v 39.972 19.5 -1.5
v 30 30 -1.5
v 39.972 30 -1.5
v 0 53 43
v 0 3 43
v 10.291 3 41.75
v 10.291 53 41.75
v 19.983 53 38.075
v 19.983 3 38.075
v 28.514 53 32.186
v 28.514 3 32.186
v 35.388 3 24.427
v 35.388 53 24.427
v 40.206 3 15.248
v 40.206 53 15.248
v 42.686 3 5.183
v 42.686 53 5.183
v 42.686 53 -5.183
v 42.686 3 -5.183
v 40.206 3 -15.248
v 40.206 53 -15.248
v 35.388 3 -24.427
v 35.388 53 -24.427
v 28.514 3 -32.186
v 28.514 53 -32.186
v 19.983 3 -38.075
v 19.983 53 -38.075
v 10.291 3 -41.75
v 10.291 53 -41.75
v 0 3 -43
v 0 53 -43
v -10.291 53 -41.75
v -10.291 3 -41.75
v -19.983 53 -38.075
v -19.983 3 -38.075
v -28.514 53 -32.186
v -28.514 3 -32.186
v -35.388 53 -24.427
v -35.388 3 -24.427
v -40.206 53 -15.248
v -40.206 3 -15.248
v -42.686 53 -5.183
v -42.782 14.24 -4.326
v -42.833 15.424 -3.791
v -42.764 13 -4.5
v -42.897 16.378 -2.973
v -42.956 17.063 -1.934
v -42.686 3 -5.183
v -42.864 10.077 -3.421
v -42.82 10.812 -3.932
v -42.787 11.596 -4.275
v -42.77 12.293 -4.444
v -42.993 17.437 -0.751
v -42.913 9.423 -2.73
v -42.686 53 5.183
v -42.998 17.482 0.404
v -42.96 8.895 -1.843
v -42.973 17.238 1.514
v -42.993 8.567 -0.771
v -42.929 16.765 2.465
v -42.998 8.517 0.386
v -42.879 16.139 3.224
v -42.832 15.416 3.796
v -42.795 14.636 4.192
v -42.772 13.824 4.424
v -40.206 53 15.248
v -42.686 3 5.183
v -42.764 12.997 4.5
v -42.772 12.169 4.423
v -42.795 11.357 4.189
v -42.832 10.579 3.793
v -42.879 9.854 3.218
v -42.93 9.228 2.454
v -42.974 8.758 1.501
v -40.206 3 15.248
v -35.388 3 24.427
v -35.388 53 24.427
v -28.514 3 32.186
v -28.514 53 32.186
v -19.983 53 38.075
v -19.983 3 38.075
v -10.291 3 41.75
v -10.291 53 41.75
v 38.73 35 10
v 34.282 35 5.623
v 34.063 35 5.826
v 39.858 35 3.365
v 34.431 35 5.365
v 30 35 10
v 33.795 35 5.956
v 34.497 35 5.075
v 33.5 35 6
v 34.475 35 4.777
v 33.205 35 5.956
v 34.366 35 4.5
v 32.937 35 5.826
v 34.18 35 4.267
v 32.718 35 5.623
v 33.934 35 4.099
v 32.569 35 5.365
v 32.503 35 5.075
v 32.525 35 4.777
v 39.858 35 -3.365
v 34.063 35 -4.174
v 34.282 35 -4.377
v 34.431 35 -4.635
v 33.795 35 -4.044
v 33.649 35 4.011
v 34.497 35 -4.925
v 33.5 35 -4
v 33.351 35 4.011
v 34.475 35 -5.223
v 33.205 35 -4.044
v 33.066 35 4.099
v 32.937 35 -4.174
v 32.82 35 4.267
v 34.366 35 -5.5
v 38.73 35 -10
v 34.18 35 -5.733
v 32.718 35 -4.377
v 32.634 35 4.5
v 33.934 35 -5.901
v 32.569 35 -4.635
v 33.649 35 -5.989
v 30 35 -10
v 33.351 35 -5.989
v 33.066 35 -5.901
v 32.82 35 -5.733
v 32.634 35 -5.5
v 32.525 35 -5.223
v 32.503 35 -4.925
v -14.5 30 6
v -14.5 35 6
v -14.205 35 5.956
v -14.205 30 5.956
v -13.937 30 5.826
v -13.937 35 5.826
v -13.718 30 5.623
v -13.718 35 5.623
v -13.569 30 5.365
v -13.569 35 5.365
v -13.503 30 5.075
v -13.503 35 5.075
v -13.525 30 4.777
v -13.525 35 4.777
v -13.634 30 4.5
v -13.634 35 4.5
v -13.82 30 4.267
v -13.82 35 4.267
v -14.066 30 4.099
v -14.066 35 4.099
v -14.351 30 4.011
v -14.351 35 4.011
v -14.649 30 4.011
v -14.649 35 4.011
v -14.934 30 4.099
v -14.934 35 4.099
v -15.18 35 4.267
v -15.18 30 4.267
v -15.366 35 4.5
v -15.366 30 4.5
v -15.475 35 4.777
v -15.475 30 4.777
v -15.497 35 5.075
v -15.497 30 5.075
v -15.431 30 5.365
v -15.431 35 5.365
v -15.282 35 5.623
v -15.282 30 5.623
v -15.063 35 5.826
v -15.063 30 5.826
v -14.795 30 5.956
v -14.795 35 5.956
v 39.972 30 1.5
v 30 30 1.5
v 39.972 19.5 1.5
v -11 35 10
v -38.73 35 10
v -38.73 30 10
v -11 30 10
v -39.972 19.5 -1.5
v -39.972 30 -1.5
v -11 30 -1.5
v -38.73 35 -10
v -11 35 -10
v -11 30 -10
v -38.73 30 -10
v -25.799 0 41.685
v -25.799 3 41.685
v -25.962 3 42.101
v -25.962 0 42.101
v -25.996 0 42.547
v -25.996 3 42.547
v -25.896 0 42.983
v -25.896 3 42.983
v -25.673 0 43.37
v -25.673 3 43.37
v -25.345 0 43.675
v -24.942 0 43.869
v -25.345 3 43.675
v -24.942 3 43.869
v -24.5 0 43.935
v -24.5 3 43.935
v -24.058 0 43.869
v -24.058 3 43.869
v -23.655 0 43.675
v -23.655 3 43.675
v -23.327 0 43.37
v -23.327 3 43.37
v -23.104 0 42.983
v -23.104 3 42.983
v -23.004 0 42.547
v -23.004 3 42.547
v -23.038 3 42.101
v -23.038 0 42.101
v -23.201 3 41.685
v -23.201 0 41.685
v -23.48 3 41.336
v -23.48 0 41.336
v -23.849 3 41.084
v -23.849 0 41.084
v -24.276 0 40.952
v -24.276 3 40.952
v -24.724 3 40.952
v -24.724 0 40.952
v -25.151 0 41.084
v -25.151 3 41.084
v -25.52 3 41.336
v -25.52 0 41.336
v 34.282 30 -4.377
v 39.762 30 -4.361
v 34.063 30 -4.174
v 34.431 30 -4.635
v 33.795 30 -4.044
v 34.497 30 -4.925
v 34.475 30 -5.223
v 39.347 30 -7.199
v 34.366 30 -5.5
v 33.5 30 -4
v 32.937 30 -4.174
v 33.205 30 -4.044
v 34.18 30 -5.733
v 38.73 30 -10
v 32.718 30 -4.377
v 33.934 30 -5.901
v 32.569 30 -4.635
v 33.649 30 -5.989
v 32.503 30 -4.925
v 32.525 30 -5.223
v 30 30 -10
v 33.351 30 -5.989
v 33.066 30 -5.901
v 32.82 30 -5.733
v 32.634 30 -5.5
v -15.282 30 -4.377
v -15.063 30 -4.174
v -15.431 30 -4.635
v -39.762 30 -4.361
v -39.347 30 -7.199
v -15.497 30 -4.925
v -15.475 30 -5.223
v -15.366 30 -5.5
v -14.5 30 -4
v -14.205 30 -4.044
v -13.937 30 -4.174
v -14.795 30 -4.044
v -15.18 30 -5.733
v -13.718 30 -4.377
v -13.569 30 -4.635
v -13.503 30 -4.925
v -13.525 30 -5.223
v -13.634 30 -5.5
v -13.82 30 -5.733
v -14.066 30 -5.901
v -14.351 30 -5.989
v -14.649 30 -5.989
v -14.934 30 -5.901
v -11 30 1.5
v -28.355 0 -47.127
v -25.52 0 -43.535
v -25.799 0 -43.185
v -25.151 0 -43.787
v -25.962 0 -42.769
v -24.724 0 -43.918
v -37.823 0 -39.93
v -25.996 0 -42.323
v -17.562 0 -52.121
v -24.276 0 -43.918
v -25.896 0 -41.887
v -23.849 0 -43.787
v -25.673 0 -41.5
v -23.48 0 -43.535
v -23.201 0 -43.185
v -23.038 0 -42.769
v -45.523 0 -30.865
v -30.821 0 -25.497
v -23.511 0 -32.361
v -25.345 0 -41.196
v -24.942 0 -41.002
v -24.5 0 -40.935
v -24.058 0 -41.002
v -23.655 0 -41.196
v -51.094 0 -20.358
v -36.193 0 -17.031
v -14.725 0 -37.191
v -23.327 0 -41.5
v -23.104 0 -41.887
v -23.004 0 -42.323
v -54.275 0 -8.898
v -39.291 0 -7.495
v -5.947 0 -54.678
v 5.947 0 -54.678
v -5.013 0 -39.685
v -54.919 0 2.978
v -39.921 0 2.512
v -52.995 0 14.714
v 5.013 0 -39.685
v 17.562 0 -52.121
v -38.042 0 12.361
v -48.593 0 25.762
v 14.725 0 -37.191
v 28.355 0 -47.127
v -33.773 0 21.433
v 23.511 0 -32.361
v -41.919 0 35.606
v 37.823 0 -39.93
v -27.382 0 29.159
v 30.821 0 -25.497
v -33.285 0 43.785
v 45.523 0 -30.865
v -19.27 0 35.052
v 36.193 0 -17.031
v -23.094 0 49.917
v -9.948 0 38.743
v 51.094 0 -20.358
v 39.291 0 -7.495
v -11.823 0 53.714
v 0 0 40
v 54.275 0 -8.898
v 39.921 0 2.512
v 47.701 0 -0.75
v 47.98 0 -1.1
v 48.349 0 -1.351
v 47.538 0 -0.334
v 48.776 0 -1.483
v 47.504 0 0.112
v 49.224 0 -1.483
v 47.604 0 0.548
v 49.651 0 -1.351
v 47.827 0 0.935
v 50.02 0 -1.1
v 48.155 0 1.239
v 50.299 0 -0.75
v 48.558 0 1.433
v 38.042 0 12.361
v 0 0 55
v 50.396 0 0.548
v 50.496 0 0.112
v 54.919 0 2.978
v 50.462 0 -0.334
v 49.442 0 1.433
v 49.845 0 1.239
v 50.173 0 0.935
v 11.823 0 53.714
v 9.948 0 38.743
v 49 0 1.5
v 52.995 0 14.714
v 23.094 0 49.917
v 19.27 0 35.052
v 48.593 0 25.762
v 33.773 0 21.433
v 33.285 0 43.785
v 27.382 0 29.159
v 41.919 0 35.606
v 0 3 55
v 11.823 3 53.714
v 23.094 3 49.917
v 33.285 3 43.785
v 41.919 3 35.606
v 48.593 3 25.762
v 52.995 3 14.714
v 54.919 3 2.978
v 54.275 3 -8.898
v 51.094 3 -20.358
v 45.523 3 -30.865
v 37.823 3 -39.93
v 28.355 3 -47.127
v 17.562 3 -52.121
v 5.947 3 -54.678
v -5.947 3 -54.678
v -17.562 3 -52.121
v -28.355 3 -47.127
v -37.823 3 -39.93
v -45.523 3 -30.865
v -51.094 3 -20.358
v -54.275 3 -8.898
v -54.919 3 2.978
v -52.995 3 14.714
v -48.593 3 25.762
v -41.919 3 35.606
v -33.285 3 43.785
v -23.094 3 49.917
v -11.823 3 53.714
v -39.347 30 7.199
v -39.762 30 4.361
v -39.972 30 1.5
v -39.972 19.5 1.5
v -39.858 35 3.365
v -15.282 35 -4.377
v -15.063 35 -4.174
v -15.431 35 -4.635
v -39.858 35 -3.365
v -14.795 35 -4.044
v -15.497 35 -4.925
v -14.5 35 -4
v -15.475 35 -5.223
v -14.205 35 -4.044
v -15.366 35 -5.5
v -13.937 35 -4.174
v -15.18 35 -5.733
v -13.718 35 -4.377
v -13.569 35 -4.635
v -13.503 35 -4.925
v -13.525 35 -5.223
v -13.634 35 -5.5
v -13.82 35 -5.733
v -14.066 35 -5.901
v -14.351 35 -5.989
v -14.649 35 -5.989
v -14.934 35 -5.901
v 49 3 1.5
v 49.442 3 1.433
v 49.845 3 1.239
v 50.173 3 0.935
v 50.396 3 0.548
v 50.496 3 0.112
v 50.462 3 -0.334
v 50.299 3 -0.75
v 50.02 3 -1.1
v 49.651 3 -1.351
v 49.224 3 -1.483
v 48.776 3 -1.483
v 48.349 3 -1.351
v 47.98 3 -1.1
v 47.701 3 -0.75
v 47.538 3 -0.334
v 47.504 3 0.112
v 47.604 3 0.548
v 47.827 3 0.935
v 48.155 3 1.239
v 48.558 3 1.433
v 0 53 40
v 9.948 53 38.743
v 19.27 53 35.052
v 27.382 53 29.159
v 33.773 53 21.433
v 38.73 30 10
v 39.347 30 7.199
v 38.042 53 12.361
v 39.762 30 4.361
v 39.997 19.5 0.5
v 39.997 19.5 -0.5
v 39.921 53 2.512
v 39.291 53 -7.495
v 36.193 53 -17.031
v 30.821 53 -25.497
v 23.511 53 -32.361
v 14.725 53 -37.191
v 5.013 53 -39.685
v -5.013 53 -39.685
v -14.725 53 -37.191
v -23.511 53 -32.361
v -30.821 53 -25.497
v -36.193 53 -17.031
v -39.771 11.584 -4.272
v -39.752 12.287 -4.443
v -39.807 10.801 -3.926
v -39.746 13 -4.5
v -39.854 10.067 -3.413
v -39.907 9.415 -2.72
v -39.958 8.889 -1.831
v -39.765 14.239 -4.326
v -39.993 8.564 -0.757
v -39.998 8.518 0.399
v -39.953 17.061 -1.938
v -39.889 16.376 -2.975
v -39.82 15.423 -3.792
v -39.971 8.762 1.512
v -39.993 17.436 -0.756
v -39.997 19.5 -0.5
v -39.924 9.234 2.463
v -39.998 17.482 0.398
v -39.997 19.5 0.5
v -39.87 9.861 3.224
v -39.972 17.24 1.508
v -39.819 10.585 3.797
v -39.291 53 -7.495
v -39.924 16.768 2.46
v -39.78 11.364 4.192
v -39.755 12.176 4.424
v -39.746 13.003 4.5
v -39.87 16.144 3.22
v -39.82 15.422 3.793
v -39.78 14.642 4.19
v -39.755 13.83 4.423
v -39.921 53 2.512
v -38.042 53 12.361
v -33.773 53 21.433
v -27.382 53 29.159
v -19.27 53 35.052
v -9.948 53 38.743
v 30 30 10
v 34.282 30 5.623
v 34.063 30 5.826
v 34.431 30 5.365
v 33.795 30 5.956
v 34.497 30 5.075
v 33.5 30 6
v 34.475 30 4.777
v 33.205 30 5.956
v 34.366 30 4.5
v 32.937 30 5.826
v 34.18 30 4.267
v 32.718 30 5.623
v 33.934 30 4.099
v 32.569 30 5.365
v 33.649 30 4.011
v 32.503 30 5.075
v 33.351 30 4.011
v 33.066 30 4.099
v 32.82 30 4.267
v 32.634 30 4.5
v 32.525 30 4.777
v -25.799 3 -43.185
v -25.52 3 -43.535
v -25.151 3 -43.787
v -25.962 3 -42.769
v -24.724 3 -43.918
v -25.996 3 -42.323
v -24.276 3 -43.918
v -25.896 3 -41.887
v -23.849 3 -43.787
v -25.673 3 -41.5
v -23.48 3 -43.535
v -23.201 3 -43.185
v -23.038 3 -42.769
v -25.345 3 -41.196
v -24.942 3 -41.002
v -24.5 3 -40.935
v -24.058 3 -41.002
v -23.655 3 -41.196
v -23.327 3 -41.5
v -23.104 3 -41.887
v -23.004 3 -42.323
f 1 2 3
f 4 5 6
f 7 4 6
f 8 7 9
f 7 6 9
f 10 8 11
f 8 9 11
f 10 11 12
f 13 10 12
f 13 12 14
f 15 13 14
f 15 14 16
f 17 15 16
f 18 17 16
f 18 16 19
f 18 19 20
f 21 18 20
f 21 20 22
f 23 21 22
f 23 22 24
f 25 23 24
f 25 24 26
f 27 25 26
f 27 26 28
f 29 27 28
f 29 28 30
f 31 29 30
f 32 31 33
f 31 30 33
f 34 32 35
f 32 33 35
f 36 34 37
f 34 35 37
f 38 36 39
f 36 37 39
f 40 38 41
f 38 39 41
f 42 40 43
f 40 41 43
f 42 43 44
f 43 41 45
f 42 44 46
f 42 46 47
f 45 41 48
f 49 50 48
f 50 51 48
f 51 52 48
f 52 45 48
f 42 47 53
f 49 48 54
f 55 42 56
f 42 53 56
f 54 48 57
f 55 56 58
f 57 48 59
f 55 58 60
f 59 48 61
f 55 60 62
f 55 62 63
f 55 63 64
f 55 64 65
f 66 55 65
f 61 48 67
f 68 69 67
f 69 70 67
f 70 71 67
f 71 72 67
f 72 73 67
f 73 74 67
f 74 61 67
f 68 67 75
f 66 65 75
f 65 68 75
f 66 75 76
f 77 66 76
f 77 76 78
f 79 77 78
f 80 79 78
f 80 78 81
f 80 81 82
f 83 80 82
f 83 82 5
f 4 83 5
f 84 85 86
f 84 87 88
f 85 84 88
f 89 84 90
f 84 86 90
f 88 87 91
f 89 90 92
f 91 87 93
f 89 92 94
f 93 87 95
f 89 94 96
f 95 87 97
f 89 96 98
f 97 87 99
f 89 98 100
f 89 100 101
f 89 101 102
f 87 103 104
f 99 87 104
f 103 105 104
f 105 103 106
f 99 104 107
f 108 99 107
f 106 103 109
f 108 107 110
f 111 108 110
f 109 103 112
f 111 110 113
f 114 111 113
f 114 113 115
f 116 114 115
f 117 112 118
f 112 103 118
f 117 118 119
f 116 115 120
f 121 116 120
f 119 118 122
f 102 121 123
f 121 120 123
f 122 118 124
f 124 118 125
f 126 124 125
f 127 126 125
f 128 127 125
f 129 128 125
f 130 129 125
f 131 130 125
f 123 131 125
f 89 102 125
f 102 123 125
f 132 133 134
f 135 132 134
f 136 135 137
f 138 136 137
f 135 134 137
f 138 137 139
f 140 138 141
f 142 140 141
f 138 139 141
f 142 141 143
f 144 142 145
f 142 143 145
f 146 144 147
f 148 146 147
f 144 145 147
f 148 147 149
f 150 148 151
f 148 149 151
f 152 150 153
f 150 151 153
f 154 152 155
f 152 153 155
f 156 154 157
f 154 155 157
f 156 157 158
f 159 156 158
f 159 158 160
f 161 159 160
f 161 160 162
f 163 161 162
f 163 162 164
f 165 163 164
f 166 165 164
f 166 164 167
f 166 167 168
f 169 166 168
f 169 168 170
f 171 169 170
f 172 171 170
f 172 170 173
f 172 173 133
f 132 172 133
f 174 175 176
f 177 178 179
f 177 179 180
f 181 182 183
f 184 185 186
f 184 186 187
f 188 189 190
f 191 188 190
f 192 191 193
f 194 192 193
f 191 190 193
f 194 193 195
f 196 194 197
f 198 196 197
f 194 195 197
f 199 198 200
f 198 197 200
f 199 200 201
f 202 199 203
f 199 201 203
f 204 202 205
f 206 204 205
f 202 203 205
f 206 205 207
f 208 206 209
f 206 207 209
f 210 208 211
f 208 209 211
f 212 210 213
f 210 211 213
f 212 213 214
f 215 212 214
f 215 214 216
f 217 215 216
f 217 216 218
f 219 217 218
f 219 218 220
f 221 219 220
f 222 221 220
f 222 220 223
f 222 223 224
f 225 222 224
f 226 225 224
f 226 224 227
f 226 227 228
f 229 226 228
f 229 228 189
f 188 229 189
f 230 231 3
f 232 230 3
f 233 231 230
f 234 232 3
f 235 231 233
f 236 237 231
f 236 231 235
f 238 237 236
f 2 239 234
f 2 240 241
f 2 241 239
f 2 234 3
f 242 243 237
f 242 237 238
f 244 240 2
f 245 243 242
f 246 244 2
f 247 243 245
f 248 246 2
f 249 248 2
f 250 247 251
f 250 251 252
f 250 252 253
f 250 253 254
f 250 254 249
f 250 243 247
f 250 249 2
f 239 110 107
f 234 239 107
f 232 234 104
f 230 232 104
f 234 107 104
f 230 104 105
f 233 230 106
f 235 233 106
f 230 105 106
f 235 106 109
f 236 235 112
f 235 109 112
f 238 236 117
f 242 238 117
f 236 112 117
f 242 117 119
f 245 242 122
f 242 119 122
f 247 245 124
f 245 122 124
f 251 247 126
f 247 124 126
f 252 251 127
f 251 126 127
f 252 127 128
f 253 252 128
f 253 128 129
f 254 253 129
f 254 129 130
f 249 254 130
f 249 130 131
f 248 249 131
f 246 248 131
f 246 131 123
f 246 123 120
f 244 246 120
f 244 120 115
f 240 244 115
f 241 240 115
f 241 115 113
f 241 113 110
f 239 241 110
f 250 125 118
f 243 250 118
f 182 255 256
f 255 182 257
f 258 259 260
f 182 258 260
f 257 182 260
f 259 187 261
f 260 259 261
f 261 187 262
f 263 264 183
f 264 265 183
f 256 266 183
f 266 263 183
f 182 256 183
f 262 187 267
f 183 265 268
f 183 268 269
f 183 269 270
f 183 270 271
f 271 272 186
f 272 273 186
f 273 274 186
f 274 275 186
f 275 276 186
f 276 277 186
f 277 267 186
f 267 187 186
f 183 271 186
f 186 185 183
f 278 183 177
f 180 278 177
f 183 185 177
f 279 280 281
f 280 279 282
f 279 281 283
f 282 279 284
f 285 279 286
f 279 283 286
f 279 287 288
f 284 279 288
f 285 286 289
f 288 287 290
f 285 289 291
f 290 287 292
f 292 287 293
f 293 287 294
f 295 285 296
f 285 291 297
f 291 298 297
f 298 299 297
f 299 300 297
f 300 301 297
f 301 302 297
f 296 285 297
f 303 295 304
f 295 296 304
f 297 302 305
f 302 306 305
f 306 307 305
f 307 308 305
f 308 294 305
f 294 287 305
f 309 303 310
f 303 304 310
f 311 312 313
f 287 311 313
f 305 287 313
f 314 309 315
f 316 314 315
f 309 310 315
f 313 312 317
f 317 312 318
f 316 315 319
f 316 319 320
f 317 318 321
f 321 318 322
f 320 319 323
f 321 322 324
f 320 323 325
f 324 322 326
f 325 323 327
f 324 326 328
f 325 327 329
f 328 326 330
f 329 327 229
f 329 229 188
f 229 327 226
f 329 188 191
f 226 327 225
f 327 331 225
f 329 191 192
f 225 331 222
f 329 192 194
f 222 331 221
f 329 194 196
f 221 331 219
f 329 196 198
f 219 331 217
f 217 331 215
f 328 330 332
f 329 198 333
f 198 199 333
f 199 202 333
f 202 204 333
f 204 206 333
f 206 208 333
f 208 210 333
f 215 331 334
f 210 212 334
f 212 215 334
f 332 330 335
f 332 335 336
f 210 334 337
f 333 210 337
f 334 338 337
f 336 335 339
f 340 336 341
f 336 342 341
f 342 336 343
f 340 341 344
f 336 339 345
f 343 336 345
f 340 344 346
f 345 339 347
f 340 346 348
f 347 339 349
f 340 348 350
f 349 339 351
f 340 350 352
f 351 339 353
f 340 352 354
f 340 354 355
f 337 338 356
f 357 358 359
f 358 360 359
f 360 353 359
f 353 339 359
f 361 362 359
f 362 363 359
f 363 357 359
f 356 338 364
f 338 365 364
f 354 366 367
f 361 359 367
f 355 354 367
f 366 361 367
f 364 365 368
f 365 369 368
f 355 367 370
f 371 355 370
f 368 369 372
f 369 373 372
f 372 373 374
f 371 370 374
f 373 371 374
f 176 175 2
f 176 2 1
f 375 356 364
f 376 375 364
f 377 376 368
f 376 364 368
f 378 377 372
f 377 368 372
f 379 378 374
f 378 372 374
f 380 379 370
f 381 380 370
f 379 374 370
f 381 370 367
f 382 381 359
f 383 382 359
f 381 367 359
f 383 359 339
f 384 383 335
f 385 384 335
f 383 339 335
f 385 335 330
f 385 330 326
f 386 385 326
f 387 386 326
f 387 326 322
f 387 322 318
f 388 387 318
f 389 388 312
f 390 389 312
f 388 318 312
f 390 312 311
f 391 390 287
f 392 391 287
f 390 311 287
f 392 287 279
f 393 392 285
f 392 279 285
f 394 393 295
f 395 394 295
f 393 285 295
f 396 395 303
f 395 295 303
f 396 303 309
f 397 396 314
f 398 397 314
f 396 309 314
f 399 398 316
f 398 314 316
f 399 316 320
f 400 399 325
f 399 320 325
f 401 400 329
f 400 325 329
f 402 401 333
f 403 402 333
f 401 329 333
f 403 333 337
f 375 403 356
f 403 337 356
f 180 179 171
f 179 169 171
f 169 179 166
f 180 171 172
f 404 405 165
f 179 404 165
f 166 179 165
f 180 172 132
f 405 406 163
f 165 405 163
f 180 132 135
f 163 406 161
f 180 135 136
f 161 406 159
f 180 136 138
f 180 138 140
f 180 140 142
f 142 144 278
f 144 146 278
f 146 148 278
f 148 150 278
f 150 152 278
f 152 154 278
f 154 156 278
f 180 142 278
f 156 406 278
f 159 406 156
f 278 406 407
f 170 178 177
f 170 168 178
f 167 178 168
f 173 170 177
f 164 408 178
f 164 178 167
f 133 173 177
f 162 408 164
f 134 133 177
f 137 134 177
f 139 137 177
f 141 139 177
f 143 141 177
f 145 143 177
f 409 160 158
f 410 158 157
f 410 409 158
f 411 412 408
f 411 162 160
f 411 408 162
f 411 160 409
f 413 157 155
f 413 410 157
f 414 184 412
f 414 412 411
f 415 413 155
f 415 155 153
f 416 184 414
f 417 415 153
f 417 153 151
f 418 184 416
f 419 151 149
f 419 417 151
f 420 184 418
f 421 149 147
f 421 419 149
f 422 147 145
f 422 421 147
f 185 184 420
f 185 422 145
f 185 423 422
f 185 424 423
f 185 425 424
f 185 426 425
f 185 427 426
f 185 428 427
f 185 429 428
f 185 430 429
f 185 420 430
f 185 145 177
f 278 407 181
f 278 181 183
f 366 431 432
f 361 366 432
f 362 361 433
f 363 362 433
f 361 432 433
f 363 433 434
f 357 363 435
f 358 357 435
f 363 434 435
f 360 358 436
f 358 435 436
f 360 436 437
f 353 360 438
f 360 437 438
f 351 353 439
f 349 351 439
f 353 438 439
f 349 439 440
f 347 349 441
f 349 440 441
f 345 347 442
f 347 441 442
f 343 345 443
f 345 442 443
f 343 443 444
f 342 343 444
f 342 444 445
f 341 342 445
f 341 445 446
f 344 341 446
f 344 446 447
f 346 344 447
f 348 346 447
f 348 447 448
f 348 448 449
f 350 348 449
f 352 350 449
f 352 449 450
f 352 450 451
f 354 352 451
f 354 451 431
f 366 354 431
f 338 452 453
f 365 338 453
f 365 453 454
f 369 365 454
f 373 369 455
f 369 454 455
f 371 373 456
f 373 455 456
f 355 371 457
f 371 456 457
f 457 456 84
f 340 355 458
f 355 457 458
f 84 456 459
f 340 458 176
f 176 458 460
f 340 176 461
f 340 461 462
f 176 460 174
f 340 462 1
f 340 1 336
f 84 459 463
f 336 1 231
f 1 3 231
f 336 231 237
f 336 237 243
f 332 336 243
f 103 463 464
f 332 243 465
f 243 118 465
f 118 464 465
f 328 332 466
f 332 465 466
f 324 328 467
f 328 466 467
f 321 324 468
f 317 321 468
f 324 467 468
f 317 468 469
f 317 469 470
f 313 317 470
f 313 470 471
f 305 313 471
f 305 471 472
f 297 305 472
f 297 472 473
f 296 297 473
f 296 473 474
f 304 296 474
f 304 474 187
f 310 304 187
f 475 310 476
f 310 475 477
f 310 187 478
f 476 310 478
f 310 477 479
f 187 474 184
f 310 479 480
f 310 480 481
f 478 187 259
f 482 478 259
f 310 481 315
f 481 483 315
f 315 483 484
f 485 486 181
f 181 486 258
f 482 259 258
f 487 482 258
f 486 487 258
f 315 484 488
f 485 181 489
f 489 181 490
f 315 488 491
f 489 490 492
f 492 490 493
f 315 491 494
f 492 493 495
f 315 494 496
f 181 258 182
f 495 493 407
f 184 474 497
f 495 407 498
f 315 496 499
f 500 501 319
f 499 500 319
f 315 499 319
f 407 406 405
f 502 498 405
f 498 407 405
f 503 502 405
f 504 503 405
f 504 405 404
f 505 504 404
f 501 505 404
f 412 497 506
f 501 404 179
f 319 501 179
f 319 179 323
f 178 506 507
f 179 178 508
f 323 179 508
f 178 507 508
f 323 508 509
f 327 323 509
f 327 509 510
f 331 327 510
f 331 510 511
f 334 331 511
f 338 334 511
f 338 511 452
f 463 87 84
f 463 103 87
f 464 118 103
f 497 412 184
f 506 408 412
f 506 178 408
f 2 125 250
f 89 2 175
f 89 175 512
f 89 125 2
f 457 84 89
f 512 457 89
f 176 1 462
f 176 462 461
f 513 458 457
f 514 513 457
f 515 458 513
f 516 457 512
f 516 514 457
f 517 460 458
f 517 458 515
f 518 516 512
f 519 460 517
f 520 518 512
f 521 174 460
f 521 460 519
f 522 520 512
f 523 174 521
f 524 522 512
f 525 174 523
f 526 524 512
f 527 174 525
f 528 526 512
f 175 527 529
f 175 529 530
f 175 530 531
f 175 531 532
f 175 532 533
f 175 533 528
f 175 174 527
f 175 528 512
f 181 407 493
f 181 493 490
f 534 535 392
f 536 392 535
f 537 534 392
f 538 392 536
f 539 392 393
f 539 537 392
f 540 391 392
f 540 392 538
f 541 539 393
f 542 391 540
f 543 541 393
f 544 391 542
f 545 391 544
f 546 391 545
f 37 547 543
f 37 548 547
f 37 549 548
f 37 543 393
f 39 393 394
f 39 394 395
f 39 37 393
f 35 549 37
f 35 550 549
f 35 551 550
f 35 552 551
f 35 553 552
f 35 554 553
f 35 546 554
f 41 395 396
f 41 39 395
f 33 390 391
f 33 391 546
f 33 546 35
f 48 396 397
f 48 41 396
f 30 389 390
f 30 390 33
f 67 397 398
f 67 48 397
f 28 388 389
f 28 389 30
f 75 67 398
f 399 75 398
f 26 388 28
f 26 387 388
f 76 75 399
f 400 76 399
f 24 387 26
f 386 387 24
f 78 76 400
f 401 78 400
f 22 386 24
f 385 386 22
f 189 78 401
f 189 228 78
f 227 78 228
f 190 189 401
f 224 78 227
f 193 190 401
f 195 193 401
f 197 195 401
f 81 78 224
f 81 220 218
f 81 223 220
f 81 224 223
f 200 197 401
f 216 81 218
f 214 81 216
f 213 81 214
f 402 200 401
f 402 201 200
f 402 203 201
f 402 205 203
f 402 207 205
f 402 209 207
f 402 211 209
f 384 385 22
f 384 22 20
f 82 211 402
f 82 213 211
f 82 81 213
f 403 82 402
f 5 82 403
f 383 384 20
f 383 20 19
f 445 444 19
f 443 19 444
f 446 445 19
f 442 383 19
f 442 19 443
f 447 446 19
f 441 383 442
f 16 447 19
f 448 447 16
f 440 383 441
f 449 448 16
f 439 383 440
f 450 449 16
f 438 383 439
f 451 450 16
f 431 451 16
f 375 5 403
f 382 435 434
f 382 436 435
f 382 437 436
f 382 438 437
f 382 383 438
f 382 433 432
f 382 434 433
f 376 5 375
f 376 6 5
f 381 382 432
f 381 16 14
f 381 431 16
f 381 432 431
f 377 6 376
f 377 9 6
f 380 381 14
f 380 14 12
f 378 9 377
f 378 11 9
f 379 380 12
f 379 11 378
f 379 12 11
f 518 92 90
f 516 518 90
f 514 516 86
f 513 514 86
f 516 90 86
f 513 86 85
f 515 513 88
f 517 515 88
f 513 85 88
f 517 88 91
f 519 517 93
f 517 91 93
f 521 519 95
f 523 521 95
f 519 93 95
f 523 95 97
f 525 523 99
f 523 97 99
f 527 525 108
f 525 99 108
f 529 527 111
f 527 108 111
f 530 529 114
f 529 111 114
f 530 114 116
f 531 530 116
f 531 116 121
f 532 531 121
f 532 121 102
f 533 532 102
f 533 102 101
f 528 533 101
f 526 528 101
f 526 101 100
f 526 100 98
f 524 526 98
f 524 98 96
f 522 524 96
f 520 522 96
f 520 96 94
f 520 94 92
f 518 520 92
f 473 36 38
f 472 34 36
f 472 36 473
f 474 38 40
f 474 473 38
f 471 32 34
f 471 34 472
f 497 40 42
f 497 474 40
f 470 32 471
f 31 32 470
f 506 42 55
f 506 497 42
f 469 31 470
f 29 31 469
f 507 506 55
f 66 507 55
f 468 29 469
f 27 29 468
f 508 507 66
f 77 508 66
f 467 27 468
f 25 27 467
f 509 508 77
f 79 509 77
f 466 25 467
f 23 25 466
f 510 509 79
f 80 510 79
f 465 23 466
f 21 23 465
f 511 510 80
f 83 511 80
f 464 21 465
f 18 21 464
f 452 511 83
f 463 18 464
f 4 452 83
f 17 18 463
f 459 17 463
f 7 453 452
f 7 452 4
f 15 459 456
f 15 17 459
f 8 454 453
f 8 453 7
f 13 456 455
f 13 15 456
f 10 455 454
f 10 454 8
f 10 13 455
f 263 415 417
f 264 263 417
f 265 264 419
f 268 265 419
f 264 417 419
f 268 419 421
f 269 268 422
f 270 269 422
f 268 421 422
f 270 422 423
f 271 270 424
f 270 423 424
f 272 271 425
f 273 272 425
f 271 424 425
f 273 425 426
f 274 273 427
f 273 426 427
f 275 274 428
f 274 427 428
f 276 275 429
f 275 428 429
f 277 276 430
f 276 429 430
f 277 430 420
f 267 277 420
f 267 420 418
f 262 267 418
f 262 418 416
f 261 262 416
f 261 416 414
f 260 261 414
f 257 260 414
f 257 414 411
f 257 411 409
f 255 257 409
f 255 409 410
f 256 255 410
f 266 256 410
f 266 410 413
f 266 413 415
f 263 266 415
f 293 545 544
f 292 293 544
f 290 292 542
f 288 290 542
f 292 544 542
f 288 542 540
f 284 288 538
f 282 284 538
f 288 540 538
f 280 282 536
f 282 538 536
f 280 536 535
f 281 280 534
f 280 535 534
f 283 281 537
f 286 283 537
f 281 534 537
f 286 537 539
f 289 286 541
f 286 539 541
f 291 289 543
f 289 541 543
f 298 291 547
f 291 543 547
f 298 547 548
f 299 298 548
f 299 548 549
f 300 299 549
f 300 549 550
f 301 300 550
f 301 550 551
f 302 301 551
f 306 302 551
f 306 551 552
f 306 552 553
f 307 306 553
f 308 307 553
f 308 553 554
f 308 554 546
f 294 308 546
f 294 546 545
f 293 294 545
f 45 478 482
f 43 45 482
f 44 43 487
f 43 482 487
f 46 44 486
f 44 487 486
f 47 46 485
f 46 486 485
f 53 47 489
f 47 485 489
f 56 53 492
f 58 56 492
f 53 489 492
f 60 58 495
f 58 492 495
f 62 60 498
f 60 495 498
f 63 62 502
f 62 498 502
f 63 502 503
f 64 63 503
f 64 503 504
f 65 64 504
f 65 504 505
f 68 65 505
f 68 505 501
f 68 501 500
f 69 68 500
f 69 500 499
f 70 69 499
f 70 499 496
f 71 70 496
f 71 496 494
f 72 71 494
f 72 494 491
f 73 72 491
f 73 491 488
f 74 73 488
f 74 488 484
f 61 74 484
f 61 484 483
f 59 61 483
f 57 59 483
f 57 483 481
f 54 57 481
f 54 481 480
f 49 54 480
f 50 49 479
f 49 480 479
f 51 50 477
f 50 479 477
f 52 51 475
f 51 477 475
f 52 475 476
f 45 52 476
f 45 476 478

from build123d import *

# Parameters (mm, degrees)
SKETCH1_R           = 55
BOSS_EXTRUDE1_DEPTH = 3
SKETCH2_R           = 43
BOSS_EXTRUDE2_DEPTH = 50
SKETCH3_R           = 40
CUT_EXTRUDE1_DEPTH  = 66
SKETCH10_R          = 4.5
CUT_EXTRUDE2_DEPTH  = 9
BOSS_EXTRUDE4_DEPTH = 5
SKETCH17_W          = 10.5
SKETCH17_H          = 3
BOSS_EXTRUDE7_DEPTH = 10.5
CUT_EXTRUDE6_DEPTH  = 3
SKETCH19_W          = 29.5
SKETCH19_H          = 3
BOSS_EXTRUDE8_DEPTH = 10.5
CUT_EXTRUDE7_DEPTH  = 3
SKETCH21_R          = 1.5
CUT_EXTRUDE8_DEPTH  = 8
CIRPATTERN1_COUNT   = 3
SKETCH23_R          = 1
CUT_EXTRUDE9_DEPTH  = 9
SKETCH24_R          = 1
CUT_EXTRUDE10_DEPTH = 9


with BuildPart() as part:
    # Sketch1 → Boss-Extrude1 (new body)
    with BuildSketch(Plane(origin=(0, 0, 0), x_dir=(1, 0, 0), z_dir=(0, 1, 0))):
        with Locations(Location((0, 0, 0), (0, 0, 270))):
            Circle(SKETCH1_R)
    extrude(amount=BOSS_EXTRUDE1_DEPTH)

    # Sketch2 → Boss-Extrude2 (add)
    with BuildSketch(Plane(origin=(0, 3, 0), x_dir=(1, 0, 0), z_dir=(0, 1, 0))):
        with Locations(Location((0, 0, 0), (0, 0, 270))):
            Circle(SKETCH2_R)
    extrude(amount=BOSS_EXTRUDE2_DEPTH)

    # Sketch3 → Cut-Extrude1 (cut)
    with BuildSketch(Plane(origin=(0, 53, 0), x_dir=(1, 0, 0), z_dir=(0, 1, 0))):
        with Locations(Location((0, 0, 0), (0, 0, 270))):
            Circle(SKETCH3_R)
    extrude(amount=-CUT_EXTRUDE1_DEPTH, mode=Mode.SUBTRACT)

    # Sketch10 → Cut-Extrude2 (cut)
    with BuildSketch(Plane(origin=(-39, 0, 0), x_dir=(0, 0, -1), z_dir=(1, 0, 0))):
        with Locations((0, 13)):
            Circle(SKETCH10_R)
    extrude(amount=-CUT_EXTRUDE2_DEPTH, mode=Mode.SUBTRACT)

    # Sketch12 → Boss-Extrude4 (add)
    with BuildSketch(Plane(origin=(0, 35, 0), x_dir=(1, 0, 0), z_dir=(0, 1, 0))):
        with BuildLine():
            Line((-11, 10), (-39.761790704, 10))
            ThreePointArc((-39.761790704, 10), (-41, 0), (-39.761790704, -10))
            Line((-39.761790704, -10), (-11, -10))
            Line((-11, -10), (-11, 10))
        make_face()
        with BuildLine():
            Line((30, 10), (39.761790704, 10))
            ThreePointArc((39.761790704, 10), (41, 0), (39.761790704, -10))
            Line((39.761790704, -10), (30, -10))
            Line((30, -10), (30, 10))
        make_face()
    extrude(amount=-BOSS_EXTRUDE4_DEPTH)

    # Sketch17 → Boss-Extrude7 (add)
    with BuildSketch(Plane.XZ.offset(-30)):
        with Locations((35.25, 0)):
            Rectangle(SKETCH17_W, SKETCH17_H)
    extrude(amount=BOSS_EXTRUDE7_DEPTH)

    # Sketch18 → Cut-Extrude6 (cut)
    with BuildSketch(Plane.XY.offset(1.5)):
        Polygon((30, 30), (39.971865105, 19.5), (30, 19.5), align=None)
    extrude(amount=-CUT_EXTRUDE6_DEPTH, mode=Mode.SUBTRACT)

    # Sketch19 → Boss-Extrude8 (add)
    with BuildSketch(Plane.XZ.offset(-30)):
        with Locations((-25.75, 0)):
            Rectangle(SKETCH19_W, SKETCH19_H)
    extrude(amount=BOSS_EXTRUDE8_DEPTH)

    # Sketch20 → Cut-Extrude7 (cut)
    with BuildSketch(Plane.XY.offset(1.5)):
        Polygon((-39.971865105, 19.5), (-11, 30), (-11, 19.5), align=None)
    extrude(amount=-CUT_EXTRUDE7_DEPTH, mode=Mode.SUBTRACT)

    # Sketch21 → Cut-Extrude8 (cut)
    with BuildSketch(Plane(origin=(0, 3, 0), x_dir=(1, 0, 0), z_dir=(0, 1, 0))):
        with Locations(Location((49, 0, 0), (0, 0, 270))):
            Circle(SKETCH21_R)
    cut_extrude8 = extrude(amount=-CUT_EXTRUDE8_DEPTH, mode=Mode.SUBTRACT)

    # CirPattern1: Cut-Extrude8 ×3 about axis
    cirpattern1_axis = Axis((0, 0, 0), (0, 1, 0))
    for i in range(1, CIRPATTERN1_COUNT):
        add(cut_extrude8.rotate(cirpattern1_axis, i * 360 / CIRPATTERN1_COUNT), mode=Mode.SUBTRACT)

    # Sketch23 → Cut-Extrude9 (cut)
    with BuildSketch(Plane(origin=(0, 35, 0), x_dir=(1, 0, 0), z_dir=(0, 1, 0))):
        with Locations(Location((-14.5, 5, 0), (0, 0, 270))):
            Circle(SKETCH23_R)
        with Locations(Location((-14.5, -5, 0), (0, 0, 270))):
            Circle(SKETCH23_R)
    extrude(amount=-CUT_EXTRUDE9_DEPTH, mode=Mode.SUBTRACT)

    # Sketch24 → Cut-Extrude10 (cut)
    with BuildSketch(Plane(origin=(0, 35, 0), x_dir=(1, 0, 0), z_dir=(0, 1, 0))):
        with Locations(Location((33.5, 5, 0), (0, 0, 270))):
            Circle(SKETCH24_R)
        with Locations(Location((33.5, -5, 0), (0, 0, 270))):
            Circle(SKETCH24_R)
    extrude(amount=-CUT_EXTRUDE10_DEPTH, mode=Mode.SUBTRACT)


solid = part.part
